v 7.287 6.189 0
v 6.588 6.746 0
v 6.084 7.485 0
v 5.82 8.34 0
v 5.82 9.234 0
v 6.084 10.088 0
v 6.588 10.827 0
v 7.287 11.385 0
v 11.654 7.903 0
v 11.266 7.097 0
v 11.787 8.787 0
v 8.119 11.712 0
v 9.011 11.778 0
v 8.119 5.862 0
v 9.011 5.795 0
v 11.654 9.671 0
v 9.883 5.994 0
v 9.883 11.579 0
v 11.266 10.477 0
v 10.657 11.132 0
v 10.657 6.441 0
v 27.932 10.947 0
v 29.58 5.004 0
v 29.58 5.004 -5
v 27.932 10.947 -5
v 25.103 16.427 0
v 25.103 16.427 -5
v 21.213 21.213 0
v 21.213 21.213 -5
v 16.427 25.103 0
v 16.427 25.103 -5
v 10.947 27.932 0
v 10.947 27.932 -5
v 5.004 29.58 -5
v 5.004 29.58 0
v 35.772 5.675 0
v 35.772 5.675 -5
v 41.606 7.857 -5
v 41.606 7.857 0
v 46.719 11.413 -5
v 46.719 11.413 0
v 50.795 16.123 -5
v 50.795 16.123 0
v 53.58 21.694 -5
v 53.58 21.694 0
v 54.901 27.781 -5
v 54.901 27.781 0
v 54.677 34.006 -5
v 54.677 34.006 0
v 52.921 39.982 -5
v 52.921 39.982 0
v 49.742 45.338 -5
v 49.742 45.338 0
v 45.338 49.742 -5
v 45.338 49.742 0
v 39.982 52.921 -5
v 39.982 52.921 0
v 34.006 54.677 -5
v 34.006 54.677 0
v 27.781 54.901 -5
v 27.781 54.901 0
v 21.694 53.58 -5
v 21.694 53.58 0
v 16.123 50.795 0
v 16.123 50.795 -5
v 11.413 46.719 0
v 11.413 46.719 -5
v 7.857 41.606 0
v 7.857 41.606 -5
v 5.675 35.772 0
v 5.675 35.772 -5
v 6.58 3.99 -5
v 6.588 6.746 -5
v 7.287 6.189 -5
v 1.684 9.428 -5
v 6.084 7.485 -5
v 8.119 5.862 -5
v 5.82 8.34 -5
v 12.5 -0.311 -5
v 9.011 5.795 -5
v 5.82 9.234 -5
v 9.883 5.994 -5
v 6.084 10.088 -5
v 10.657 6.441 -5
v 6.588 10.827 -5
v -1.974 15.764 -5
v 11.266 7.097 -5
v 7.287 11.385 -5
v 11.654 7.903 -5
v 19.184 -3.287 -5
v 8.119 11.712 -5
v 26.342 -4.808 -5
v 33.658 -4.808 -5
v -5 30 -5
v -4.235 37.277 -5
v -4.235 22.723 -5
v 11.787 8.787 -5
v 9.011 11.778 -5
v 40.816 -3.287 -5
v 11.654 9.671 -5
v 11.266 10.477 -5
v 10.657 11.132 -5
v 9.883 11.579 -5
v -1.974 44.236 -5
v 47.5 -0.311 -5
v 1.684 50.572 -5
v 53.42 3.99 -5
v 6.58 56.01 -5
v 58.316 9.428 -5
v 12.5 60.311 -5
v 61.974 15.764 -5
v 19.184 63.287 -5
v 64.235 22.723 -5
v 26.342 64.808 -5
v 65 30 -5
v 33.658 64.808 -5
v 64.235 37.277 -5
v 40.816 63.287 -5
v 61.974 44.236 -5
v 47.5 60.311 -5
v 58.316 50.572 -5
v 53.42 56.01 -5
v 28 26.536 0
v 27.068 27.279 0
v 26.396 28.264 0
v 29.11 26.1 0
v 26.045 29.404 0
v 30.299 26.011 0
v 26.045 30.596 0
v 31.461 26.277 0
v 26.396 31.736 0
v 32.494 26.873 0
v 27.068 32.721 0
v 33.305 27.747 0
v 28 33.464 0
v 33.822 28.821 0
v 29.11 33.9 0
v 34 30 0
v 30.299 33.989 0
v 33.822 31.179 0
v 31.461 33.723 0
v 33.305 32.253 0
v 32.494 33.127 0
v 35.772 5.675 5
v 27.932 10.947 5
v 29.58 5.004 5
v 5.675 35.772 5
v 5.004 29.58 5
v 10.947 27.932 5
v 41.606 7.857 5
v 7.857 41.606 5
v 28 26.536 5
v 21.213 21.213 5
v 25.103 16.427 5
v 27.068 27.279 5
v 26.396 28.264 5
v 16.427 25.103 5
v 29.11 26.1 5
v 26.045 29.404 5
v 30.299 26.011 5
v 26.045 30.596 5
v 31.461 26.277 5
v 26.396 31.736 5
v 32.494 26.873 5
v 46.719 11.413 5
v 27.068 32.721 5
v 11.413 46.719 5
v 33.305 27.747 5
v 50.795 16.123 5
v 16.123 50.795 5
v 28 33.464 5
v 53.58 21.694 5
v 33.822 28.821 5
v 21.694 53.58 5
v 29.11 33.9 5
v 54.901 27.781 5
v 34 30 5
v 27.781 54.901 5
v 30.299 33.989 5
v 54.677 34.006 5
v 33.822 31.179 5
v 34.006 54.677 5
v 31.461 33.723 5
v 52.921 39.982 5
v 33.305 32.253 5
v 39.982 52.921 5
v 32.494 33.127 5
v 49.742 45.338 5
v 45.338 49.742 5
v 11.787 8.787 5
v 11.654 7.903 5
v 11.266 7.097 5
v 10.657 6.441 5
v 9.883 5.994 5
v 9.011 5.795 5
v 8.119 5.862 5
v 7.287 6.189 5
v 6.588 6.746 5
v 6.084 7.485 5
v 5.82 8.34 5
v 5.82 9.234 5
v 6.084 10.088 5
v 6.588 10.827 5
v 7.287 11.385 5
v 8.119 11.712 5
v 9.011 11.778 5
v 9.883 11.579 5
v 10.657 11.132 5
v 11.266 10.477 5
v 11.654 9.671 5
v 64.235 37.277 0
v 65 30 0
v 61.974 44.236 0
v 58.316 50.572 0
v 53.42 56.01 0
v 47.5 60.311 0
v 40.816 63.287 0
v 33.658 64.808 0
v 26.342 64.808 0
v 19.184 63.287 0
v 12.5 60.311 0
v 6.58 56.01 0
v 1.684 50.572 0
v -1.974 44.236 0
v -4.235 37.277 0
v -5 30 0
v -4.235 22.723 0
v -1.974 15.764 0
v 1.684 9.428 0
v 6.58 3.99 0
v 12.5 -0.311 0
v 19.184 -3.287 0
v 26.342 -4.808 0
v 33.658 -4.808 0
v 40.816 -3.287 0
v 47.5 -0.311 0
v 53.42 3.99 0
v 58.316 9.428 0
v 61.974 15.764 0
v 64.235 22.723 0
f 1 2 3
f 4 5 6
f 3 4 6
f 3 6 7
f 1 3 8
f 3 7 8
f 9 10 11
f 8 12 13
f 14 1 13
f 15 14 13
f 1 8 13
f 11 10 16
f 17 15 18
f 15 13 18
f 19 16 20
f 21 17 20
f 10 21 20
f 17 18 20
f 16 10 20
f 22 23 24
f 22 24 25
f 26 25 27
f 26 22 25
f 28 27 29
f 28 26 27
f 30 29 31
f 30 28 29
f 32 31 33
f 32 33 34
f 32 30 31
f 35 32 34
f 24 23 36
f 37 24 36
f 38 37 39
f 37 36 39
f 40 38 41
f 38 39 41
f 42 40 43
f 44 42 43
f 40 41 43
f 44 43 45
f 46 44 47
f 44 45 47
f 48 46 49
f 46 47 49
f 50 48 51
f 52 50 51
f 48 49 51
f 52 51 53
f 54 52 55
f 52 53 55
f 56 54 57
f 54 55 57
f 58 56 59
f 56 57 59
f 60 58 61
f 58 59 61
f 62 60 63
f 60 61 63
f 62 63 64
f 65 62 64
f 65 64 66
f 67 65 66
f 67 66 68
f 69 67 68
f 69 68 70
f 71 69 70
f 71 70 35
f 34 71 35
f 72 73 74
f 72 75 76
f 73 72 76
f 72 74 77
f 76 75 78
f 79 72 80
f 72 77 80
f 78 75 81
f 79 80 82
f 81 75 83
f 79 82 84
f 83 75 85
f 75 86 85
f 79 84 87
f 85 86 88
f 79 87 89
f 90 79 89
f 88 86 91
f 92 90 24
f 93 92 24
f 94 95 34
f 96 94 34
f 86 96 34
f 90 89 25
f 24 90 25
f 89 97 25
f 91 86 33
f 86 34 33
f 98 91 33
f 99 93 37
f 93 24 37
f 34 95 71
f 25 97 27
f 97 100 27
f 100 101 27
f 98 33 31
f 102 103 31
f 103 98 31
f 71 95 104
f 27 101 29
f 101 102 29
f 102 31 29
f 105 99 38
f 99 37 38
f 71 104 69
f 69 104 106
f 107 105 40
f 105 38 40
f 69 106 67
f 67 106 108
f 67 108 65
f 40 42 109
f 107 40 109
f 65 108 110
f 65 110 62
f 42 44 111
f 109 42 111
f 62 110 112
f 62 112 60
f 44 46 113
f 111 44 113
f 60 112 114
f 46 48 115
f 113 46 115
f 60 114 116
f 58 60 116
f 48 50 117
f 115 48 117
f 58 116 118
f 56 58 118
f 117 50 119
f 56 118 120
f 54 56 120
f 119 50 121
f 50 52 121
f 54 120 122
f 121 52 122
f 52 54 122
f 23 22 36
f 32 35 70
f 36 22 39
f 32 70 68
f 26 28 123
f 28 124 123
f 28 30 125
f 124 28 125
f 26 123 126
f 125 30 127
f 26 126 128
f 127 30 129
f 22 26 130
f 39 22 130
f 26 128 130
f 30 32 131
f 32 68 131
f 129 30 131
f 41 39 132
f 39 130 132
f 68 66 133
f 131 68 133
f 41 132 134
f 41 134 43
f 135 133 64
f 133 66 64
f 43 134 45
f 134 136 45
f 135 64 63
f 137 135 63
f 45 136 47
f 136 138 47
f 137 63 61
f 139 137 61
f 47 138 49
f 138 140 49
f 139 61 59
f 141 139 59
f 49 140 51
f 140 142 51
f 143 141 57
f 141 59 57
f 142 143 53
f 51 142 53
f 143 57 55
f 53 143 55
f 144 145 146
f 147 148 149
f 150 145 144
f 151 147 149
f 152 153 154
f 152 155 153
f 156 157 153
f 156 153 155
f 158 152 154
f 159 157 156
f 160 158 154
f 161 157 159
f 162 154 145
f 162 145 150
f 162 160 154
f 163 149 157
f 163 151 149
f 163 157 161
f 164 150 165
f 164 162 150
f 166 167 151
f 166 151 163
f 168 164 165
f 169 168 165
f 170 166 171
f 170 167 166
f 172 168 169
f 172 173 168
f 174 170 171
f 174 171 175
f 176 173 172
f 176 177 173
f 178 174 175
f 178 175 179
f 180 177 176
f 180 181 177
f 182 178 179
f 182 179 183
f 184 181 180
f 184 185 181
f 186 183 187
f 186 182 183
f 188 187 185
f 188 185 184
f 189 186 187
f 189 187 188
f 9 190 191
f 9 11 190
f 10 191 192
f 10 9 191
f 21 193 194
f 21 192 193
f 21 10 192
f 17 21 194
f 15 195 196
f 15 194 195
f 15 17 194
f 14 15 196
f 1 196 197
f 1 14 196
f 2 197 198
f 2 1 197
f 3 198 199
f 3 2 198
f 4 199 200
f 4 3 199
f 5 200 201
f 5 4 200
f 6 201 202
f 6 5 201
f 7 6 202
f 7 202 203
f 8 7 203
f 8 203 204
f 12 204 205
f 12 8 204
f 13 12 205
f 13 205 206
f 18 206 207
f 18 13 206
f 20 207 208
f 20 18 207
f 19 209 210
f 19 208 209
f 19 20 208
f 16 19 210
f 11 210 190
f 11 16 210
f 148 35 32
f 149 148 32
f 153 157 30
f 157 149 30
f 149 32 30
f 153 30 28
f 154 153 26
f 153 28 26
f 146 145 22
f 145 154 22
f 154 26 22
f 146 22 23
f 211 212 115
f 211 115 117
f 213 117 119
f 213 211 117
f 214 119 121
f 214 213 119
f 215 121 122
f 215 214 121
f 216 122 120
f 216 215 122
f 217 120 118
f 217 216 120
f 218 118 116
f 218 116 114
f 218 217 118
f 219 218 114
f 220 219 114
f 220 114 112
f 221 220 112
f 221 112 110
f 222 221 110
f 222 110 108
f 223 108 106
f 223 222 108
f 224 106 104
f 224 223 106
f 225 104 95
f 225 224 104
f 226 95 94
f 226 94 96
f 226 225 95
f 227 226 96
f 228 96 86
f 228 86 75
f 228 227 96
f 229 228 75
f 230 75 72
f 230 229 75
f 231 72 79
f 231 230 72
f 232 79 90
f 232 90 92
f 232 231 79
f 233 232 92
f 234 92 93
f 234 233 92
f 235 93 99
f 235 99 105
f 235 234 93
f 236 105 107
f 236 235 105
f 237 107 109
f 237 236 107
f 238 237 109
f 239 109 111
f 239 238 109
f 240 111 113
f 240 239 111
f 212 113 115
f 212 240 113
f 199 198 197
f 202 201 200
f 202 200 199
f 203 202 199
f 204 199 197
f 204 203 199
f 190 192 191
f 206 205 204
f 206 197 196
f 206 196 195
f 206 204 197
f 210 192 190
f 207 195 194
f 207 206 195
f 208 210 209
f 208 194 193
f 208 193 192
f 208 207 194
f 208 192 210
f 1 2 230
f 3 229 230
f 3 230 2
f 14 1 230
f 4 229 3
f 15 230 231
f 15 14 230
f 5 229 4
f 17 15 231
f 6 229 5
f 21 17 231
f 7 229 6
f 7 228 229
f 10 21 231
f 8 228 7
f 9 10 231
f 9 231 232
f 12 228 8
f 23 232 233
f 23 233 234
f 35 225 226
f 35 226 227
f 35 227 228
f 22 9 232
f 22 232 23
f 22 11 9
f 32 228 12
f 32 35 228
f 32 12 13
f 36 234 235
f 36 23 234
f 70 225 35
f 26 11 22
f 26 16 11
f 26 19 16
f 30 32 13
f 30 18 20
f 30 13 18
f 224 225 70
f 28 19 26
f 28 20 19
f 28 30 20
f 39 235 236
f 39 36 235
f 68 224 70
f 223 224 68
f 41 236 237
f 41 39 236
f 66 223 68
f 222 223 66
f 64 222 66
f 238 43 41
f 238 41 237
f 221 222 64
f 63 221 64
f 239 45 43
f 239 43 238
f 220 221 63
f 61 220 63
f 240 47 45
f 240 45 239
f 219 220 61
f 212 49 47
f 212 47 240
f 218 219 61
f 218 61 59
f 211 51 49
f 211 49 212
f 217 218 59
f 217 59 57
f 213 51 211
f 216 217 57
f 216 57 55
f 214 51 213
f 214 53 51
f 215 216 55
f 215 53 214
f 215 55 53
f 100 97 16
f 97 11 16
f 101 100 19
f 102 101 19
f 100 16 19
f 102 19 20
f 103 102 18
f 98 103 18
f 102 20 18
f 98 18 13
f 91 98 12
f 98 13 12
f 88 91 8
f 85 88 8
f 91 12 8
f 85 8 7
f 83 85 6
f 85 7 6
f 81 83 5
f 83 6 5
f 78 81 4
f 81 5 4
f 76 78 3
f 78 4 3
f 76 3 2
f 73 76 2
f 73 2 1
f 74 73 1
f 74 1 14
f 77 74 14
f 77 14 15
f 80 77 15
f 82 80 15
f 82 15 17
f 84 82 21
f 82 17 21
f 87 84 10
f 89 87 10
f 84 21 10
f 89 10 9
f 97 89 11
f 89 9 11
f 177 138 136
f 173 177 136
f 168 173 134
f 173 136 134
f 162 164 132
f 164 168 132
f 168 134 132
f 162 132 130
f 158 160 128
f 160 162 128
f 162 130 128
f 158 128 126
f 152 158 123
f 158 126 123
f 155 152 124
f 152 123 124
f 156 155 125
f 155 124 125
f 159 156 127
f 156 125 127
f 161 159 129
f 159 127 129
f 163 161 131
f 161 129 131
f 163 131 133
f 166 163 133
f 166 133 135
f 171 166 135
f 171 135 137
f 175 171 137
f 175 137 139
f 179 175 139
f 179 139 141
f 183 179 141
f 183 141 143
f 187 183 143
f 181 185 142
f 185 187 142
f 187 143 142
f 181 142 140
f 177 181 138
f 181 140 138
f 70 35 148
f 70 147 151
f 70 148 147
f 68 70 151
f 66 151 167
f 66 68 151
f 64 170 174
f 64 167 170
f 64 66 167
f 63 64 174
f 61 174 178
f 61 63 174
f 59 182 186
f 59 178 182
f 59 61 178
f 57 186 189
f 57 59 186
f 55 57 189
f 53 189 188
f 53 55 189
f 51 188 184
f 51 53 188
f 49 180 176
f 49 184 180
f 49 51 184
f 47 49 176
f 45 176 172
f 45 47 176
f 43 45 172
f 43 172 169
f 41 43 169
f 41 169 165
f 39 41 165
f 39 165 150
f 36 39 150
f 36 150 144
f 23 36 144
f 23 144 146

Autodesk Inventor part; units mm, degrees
ref_plane "YZ Plane" through (0, 0, 0) normal (1, 0, 0) x (0, 1, 0)
ref_plane "XZ Plane" through (0, 0, 0) normal (0, 1, 0) x (-1, 0, 0)
ref_plane "XY Plane" through (0, 0, 0) normal (0, 0, 1) x (1, 0, 0)
sketch "Sketch1" plane through (0, 0, 0) normal (0, 0, 1) x (1, 0, 0)
  line L0 (0, 0) -> (30, 0) construction
  line L1 (30, 0) -> (30, 30) construction
  line L2 (30, 30) -> (0, 30) construction
  line L3 (0, 30) -> (0, 0) construction
  circle A0 centre (0, 0) radius 30 construction
  circle A1 centre (30, 30) radius 30 construction
  arc A2 (29.5798, 5.0035) -> (5.0035, 29.5798) centre (30, 30) ccw
  circle A3 centre (30, 30) radius 35
  arc A4 (29.5798, 5.0035) -> (5.0035, 29.5798) centre (0, 0) ccw
  line L4 (0, 0) -> (30, 30) construction
  circle A5 centre (30, 30) radius 4
  circle A6 centre (8.7868, 8.7868) radius 3
  dimension "d3" = 60
  dimension "d0" = 30
  dimension "d1" = 30
  dimension "d2" = 60
  dimension "d4" = 50
  dimension "d5" = 70
  dimension "d6" = 8
  dimension "d7" = 6
extrude "Extrusion1" add sketch "Sketch1" along normal blind 5 contours A4 A2 | A6
extrude "Extrusion2" add sketch "Sketch1" against normal blind 5 contours A3
properties part number "Geneva_driver"
